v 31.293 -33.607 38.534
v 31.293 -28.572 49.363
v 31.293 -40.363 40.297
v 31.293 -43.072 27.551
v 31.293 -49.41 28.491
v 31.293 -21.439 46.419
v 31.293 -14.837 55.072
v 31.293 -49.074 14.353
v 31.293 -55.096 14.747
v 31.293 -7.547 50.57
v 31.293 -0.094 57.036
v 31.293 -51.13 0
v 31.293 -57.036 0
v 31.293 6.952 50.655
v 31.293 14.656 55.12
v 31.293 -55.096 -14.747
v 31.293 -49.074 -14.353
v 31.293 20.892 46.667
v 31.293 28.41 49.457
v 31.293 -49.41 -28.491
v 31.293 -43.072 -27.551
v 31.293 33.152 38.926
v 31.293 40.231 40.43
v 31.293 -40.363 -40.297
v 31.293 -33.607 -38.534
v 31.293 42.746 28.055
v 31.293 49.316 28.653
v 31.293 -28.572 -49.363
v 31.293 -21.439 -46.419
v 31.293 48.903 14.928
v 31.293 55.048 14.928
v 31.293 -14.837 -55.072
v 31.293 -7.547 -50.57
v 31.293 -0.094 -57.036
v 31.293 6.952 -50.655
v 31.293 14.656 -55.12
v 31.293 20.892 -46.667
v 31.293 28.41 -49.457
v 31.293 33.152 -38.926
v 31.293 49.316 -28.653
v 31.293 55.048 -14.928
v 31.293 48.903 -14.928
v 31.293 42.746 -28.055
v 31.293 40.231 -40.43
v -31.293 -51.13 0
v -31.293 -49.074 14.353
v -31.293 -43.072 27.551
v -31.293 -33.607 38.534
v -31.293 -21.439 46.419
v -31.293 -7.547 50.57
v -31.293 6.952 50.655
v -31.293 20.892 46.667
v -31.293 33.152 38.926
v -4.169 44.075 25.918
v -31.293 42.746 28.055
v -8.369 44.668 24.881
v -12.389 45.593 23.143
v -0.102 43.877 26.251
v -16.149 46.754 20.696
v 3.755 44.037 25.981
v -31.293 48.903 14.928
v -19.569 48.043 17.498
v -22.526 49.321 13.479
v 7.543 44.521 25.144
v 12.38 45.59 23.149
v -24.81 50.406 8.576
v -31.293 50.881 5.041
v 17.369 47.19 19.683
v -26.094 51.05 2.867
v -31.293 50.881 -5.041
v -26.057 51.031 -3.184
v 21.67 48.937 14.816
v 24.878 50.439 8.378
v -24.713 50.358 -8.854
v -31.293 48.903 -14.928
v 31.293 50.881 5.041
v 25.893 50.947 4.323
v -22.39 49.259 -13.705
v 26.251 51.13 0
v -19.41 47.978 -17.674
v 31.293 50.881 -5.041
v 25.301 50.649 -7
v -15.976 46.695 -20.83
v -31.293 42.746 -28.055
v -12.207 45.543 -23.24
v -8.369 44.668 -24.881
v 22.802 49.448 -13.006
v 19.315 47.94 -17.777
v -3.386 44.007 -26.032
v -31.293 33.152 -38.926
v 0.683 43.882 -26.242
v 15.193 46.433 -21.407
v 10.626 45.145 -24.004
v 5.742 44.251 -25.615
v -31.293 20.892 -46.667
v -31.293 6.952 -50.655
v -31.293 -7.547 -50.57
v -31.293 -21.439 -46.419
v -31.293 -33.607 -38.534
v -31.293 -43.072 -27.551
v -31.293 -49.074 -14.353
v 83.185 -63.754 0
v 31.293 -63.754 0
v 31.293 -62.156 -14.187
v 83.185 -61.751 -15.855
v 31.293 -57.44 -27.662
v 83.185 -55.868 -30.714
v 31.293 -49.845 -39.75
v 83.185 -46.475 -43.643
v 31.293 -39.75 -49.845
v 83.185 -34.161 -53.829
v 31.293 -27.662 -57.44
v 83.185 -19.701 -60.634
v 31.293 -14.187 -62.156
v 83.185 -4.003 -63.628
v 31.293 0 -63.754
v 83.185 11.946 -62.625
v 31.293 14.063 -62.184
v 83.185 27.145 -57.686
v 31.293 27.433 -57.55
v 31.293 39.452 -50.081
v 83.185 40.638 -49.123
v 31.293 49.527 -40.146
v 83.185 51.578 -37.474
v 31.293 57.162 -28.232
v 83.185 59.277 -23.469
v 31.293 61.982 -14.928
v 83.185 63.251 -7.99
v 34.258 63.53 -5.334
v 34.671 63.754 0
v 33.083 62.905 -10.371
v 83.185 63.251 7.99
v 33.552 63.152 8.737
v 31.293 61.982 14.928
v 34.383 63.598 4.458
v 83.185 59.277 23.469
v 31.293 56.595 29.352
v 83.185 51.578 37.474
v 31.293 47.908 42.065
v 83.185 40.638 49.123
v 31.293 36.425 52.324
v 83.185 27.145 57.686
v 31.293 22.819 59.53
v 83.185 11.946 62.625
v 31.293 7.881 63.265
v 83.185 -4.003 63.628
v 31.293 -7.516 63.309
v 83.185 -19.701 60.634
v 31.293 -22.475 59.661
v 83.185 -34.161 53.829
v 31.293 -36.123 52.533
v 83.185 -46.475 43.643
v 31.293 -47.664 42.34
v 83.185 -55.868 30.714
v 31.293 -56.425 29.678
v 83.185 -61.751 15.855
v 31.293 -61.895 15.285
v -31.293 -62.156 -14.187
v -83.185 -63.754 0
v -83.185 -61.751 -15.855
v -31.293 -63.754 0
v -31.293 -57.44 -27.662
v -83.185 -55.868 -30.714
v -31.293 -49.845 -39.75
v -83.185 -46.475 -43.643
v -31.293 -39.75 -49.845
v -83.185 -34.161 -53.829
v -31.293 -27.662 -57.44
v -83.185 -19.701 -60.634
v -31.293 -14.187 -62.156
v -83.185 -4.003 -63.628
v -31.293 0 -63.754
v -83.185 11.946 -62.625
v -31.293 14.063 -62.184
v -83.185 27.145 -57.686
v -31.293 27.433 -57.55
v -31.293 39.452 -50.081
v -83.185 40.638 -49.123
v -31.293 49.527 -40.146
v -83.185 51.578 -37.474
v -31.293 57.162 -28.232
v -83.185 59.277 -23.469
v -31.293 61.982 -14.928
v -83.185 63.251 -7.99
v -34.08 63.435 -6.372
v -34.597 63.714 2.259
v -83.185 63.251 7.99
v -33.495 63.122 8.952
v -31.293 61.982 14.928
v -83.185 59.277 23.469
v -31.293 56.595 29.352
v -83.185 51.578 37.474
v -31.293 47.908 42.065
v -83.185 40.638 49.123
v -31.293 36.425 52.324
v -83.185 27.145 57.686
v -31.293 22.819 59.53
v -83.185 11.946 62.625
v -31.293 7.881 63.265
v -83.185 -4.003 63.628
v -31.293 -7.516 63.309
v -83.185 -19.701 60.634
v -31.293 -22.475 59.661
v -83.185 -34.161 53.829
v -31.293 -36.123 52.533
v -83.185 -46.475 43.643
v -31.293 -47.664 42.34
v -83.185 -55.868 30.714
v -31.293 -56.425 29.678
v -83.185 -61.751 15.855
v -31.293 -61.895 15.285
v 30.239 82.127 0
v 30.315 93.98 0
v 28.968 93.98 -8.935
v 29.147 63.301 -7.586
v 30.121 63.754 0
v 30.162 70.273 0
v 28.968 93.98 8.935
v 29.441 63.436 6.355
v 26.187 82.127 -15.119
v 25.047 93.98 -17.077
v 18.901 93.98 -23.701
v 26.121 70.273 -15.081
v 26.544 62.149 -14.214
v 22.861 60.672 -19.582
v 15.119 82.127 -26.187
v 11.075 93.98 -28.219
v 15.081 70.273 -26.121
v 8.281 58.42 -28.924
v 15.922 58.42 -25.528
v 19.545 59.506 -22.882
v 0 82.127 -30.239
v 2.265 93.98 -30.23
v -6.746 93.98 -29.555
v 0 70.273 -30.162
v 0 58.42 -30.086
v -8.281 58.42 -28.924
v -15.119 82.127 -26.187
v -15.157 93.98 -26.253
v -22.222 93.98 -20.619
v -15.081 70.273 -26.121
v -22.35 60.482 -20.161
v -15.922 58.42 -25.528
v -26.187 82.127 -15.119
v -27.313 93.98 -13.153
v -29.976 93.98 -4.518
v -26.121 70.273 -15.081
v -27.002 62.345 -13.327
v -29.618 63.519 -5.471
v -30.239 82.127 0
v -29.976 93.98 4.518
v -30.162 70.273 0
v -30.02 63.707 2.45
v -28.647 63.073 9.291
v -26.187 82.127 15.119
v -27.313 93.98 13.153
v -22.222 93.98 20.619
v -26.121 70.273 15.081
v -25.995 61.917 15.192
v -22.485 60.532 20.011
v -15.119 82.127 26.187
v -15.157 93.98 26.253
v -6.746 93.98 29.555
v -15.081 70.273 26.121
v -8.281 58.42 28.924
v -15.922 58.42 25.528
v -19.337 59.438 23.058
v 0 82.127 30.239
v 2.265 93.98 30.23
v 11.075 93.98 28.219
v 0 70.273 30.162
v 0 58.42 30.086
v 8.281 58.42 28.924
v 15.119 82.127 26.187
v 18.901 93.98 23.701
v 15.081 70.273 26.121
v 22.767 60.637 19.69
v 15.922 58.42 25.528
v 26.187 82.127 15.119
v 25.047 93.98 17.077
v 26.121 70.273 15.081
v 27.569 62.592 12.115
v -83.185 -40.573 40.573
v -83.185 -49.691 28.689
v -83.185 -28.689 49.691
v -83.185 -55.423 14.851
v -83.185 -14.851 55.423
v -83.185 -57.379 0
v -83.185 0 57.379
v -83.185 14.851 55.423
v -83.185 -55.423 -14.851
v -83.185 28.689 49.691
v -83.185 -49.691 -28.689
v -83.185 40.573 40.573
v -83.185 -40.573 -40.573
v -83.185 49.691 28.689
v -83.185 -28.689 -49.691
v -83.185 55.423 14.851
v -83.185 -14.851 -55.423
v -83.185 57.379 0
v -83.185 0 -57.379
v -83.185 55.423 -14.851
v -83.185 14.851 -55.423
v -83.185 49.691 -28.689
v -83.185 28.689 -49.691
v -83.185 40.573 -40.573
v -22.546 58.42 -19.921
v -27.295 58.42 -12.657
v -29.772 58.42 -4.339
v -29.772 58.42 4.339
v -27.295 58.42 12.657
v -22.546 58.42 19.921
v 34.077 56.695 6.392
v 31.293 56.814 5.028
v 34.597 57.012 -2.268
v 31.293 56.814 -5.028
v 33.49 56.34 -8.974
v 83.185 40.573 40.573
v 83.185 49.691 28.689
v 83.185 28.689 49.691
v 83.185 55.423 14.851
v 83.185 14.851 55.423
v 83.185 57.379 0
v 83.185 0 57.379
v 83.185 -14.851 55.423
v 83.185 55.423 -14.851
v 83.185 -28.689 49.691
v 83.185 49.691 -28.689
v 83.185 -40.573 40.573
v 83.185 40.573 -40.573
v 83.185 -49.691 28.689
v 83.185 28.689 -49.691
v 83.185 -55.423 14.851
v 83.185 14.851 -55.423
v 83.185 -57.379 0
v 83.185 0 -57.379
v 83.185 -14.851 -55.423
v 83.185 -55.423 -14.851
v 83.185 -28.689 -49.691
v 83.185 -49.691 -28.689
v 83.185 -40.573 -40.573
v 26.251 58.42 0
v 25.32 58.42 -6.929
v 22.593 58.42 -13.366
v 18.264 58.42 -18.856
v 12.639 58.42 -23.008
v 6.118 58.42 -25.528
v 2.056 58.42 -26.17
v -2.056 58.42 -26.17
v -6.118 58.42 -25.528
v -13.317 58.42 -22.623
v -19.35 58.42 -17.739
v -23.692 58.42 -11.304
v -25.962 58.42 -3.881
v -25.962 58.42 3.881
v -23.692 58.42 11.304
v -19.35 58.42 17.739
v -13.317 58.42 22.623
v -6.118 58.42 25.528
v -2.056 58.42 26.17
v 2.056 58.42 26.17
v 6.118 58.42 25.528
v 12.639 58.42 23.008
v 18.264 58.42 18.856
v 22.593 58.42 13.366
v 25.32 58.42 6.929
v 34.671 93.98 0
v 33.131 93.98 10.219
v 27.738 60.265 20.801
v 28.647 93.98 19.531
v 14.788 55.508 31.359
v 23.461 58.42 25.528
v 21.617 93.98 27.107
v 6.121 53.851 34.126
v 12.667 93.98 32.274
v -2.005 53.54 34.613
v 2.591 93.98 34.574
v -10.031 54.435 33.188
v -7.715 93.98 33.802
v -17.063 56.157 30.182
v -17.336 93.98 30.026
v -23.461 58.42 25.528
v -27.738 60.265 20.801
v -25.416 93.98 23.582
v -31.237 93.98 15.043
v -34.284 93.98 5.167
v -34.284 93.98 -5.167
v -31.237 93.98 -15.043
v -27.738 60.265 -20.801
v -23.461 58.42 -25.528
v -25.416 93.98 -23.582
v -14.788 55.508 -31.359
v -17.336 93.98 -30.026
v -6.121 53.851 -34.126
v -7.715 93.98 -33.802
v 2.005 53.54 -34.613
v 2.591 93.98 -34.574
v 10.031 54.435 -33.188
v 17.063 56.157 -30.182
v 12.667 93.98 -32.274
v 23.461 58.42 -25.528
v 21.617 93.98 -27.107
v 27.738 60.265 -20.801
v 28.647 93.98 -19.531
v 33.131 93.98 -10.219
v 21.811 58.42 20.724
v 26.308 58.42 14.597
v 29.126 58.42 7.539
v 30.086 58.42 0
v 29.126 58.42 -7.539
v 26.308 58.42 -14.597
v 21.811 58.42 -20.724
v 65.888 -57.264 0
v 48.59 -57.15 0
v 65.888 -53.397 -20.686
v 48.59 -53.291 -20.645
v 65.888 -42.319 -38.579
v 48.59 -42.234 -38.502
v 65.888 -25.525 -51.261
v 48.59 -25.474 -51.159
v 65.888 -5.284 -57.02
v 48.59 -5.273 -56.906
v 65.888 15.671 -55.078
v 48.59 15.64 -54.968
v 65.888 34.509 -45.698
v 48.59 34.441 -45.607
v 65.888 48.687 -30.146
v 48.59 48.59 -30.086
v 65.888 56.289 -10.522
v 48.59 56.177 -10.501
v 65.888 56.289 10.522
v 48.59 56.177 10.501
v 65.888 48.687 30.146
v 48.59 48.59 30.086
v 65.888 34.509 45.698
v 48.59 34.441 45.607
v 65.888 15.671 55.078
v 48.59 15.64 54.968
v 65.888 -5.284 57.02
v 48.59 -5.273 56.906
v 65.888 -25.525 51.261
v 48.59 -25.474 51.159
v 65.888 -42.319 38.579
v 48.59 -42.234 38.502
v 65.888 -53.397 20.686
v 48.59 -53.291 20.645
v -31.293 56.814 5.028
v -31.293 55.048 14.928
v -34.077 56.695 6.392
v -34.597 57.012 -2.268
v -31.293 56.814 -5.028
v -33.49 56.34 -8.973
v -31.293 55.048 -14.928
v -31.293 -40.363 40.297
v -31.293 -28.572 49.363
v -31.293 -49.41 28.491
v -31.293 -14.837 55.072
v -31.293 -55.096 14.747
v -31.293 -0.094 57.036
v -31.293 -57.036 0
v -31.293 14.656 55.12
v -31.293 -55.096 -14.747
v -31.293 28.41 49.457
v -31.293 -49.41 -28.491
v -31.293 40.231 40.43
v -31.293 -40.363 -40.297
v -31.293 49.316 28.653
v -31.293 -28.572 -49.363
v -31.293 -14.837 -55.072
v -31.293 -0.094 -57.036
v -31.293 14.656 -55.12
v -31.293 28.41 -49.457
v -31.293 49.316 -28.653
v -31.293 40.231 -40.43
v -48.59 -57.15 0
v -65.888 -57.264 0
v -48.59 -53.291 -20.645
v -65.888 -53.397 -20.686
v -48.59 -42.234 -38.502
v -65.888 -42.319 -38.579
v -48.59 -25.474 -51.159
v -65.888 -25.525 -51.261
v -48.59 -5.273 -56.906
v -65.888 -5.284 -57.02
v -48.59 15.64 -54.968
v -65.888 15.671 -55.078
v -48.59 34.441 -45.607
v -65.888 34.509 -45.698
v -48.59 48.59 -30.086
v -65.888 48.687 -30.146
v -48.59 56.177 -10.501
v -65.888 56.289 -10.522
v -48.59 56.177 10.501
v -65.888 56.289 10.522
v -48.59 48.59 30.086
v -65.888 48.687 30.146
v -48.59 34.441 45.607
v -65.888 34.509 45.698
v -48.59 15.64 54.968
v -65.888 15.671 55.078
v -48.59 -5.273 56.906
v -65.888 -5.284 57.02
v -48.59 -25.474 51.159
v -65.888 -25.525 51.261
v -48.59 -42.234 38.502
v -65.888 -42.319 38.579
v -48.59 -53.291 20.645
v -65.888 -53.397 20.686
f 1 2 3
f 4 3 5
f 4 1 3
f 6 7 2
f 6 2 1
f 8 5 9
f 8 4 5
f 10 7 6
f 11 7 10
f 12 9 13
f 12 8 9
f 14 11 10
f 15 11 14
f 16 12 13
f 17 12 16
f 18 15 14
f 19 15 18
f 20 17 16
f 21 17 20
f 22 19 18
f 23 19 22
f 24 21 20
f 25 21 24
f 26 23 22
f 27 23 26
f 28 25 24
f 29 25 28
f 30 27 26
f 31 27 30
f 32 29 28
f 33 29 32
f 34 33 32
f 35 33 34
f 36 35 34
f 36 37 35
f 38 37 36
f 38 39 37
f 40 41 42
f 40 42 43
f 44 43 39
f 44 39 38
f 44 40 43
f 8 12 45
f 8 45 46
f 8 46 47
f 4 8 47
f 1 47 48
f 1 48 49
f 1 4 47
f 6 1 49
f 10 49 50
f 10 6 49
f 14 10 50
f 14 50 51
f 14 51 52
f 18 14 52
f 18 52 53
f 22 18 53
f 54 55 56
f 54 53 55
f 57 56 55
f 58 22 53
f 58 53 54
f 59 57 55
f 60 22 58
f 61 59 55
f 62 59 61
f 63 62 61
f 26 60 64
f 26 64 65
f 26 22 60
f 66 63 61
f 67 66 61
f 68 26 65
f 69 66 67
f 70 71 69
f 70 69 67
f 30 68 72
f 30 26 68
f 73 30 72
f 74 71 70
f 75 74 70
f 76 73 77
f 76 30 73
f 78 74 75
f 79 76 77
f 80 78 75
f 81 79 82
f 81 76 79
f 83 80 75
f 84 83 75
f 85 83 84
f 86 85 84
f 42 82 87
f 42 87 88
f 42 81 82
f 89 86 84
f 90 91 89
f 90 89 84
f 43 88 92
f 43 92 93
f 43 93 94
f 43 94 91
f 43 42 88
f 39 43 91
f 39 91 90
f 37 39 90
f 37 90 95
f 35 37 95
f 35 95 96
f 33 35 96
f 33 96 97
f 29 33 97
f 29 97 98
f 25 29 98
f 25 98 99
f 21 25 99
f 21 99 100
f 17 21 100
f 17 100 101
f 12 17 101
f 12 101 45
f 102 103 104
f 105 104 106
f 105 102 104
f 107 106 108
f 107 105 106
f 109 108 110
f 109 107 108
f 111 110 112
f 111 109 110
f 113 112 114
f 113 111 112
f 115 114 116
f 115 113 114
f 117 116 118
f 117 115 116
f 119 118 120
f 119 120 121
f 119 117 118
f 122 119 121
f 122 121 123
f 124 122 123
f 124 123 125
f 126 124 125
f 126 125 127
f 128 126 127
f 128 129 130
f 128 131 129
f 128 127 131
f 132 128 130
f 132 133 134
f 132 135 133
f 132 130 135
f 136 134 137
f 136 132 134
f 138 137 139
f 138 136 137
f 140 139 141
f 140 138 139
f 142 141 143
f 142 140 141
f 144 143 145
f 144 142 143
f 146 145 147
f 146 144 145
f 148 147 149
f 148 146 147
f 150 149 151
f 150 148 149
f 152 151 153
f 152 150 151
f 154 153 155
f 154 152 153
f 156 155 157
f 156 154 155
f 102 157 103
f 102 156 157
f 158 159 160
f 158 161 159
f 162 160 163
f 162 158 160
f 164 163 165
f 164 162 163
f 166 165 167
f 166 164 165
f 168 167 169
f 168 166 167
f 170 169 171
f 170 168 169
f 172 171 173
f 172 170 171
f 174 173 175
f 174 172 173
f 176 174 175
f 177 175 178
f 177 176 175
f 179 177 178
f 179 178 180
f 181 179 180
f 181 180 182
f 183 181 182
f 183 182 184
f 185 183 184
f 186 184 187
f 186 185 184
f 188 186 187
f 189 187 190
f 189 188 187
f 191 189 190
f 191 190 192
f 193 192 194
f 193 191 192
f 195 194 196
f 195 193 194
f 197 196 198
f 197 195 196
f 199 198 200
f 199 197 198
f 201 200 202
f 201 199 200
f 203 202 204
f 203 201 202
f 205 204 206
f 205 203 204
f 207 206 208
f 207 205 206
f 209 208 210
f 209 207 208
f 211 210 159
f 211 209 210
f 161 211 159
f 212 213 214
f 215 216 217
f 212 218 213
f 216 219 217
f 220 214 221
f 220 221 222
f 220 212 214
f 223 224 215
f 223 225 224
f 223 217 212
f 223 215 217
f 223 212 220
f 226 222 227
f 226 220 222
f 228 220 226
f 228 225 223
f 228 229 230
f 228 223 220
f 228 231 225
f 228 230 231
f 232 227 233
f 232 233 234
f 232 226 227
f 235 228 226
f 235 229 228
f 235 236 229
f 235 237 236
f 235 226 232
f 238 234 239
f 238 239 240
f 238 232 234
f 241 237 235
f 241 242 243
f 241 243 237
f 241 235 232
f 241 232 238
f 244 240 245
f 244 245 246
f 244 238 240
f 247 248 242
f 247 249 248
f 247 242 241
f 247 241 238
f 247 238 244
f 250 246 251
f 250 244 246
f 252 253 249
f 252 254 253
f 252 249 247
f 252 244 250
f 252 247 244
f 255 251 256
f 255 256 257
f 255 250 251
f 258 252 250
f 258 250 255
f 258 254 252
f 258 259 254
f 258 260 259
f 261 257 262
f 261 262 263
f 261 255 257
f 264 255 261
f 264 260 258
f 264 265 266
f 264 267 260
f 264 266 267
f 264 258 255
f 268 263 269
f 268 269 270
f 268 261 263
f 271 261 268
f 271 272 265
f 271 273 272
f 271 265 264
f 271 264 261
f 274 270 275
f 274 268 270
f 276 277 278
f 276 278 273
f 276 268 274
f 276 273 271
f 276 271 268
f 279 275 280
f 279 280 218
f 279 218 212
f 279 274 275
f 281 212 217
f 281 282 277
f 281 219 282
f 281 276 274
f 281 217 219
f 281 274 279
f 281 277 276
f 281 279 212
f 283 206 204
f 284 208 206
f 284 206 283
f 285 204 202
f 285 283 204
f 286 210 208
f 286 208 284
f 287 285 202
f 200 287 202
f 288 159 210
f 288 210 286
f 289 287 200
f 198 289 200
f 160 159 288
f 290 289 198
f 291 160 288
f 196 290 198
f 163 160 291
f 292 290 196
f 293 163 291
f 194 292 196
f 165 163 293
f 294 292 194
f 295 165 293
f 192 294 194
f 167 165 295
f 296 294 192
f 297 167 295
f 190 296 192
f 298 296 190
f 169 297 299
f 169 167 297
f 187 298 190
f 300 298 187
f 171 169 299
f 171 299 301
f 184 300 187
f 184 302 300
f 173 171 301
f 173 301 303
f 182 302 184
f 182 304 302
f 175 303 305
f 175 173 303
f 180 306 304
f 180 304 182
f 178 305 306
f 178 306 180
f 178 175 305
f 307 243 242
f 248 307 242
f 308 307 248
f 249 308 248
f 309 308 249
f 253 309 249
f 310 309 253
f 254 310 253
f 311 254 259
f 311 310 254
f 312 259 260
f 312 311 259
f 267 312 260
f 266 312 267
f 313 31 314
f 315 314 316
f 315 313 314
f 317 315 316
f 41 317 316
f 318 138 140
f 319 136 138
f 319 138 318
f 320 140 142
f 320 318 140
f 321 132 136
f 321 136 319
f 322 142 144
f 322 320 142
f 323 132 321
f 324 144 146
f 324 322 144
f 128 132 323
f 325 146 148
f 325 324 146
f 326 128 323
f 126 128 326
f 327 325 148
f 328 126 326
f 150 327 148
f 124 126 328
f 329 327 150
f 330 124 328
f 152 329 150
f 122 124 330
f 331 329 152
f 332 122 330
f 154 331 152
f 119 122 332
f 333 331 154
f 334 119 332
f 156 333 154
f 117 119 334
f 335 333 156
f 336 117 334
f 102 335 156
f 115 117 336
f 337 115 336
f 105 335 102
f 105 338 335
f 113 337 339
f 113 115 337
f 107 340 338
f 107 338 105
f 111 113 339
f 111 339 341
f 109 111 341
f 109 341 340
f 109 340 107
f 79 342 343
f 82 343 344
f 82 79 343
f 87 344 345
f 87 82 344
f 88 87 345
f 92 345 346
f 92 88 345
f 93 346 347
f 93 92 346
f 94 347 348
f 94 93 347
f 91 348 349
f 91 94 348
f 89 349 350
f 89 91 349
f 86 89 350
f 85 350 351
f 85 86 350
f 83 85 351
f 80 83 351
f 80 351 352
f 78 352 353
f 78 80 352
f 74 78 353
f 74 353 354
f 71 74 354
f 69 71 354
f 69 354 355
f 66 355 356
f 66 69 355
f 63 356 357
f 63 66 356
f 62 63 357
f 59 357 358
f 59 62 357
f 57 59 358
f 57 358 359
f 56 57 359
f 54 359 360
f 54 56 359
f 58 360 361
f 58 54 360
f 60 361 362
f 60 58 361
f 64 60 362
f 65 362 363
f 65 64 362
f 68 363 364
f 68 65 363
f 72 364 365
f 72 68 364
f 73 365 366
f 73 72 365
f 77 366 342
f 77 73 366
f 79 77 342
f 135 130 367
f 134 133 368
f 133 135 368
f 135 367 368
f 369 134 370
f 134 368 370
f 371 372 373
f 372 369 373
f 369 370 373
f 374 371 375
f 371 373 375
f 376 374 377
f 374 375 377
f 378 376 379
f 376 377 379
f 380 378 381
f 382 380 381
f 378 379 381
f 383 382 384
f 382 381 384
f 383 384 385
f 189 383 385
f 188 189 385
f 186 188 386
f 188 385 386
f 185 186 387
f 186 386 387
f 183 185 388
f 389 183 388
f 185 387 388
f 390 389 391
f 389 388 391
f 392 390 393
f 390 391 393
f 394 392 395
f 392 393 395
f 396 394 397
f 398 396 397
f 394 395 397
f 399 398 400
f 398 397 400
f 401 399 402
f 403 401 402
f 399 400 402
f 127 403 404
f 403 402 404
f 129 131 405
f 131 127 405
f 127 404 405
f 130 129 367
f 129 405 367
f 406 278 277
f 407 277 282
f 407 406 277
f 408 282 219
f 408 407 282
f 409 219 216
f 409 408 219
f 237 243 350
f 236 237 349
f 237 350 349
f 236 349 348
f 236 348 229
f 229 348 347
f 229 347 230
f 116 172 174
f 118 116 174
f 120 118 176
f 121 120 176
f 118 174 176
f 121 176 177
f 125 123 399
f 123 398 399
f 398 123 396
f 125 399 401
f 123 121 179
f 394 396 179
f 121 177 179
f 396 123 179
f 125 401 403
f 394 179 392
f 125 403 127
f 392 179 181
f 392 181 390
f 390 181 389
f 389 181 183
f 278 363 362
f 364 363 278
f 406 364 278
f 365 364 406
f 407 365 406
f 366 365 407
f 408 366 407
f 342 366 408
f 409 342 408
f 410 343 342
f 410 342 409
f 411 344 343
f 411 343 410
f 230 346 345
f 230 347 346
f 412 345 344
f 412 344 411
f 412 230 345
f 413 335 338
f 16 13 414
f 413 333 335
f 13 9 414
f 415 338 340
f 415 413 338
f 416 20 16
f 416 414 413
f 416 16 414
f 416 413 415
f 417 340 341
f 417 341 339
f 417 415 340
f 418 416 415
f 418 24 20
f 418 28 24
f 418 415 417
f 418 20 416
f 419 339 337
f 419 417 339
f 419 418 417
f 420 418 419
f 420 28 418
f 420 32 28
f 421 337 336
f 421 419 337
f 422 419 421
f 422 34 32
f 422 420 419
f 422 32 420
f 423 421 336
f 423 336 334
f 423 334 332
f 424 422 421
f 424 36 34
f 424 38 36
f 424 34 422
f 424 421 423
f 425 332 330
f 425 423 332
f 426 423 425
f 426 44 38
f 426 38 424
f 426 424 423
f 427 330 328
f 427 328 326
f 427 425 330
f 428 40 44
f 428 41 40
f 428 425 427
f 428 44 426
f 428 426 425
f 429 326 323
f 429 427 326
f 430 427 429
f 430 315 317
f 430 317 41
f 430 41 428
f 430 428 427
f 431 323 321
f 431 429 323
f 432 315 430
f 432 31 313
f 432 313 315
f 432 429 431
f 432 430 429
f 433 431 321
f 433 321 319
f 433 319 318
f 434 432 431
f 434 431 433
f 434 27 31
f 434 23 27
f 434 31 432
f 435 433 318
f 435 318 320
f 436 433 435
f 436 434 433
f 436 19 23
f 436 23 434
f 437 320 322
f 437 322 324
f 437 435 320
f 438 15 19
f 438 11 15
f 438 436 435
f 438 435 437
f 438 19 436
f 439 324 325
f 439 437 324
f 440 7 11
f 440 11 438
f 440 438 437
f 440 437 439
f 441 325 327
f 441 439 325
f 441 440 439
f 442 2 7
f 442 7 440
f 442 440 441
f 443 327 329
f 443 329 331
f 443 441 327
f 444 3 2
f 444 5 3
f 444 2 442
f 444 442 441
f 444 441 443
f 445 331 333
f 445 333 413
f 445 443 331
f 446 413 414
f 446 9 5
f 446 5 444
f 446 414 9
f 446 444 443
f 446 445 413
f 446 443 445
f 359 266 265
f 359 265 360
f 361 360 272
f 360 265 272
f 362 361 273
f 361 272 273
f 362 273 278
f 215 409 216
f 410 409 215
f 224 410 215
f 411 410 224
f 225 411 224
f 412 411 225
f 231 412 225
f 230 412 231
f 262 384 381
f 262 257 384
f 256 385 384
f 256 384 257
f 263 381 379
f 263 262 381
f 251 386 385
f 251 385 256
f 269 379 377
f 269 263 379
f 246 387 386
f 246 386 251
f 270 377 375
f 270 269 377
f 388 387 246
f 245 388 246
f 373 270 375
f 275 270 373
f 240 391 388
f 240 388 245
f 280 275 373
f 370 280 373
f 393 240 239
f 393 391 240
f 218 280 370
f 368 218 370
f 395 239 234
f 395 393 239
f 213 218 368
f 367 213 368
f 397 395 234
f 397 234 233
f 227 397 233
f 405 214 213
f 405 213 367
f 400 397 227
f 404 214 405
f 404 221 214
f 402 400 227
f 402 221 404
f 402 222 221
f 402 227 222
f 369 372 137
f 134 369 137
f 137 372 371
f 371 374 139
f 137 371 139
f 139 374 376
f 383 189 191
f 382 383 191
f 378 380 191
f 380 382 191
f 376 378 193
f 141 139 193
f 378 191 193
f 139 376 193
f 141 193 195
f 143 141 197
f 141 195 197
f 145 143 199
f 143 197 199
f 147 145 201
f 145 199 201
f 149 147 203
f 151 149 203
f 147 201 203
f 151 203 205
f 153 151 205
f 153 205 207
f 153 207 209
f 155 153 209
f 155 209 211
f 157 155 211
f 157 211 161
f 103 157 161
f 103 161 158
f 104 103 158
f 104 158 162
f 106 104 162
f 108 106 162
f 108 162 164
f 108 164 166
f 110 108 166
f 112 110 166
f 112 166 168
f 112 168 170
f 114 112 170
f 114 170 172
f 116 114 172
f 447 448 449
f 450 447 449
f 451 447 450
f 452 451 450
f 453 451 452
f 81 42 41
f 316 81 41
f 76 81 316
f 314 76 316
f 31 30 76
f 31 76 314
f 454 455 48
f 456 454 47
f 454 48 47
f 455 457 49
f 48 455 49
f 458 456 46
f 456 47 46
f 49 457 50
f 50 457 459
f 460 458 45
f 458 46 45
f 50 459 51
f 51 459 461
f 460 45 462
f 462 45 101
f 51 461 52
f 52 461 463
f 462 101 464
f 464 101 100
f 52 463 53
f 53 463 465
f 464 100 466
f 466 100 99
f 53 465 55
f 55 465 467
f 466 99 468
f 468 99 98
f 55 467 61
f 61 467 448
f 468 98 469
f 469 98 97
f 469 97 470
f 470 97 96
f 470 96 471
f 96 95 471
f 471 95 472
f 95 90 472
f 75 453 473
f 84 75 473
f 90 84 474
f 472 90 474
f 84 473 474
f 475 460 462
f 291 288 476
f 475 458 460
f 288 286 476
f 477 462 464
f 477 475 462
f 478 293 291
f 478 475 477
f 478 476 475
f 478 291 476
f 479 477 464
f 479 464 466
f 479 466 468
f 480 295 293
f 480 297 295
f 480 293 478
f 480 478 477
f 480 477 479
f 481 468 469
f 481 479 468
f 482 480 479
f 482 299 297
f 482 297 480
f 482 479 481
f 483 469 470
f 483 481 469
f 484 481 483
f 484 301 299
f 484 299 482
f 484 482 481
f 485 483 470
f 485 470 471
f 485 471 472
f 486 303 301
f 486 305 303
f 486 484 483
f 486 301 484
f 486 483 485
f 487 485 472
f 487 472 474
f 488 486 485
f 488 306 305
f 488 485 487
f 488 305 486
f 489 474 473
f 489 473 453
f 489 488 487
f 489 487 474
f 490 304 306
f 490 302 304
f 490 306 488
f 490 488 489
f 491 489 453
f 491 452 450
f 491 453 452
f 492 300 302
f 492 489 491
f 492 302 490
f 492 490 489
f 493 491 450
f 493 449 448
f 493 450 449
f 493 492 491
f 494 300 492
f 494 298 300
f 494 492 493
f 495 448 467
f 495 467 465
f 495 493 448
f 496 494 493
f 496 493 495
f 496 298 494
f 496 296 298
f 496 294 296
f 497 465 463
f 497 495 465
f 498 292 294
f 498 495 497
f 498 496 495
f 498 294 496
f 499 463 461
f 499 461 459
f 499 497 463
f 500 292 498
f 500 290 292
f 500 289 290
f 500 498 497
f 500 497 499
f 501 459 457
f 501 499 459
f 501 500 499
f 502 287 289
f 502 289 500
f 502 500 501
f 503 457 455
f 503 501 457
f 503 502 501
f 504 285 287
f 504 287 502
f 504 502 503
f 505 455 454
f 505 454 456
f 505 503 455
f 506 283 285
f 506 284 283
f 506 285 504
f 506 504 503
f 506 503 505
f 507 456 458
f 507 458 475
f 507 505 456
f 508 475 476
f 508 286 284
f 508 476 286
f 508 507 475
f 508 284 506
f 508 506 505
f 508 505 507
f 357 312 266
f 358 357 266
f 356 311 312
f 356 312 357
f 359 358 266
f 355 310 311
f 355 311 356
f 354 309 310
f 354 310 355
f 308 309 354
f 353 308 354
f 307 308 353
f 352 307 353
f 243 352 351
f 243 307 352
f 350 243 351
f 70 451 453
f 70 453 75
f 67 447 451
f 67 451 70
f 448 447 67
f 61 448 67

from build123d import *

# Parameters (mm, degrees)
SKETCH4_R           = 63.754
BOSS_EXTRUDE1_DEPTH = 62.5856
SKETCH5_R           = 34.671
BOSS_EXTRUDE2_DEPTH = 58.42


with BuildPart() as part:
    # Sketch1 → Revolve1 (revolve)
    with BuildSketch(Plane.XY):
        Polygon((-83.185, -63.754), (-31.2928, -63.754), (-31.2928, -57.0357), (-83.185, -57.3786), align=None)
        Polygon((83.185, -57.3786), (31.2928, -57.0357), (31.2928, -63.754), (83.185, -63.754), align=None)
    revolve(axis=Axis((-83.185, 0, 0), (1, 0, 0)))



with BuildPart() as body_2:
    # Sketch2 → Revolve2 (revolve)
    with BuildSketch(Plane.XY):
        Polygon((30.3149, 93.98), (30.0863, 58.42), (34.671, 58.42), (34.671, 93.98), align=None)
    revolve(axis=Axis((0, 0, 0), (0, 1, 0)))


with BuildPart() as part_1:
    add(part.part)

    add(body_2.part)  # Boss-Extrude1 merges body 2
    # Sketch4 → Boss-Extrude1 (add)
    with BuildSketch(Plane(origin=(-31.2928, 0, 0), x_dir=(0, 0, -1), z_dir=(1, 0, 0))):
        Circle(SKETCH4_R)
    extrude(amount=BOSS_EXTRUDE1_DEPTH)

    # Sketch5 → Boss-Extrude2 (add)
    with BuildSketch(Plane.XZ.offset(-58.42)):
        Circle(SKETCH5_R)
    extrude(amount=BOSS_EXTRUDE2_DEPTH)

    # Sketch6 → Cut-Revolve1 (revolve, cut)
    with BuildSketch(Plane.XY):
        Polygon((-83.185, -57.3786), (-31.2928, -57.0357), (-31.2928, -51.1302), (31.2928, -51.1302), (31.2928, -57.0357), (83.185, -57.3786), (83.185, 0), (-83.185, 0), align=None)
    revolve(axis=Axis((83.185, 0, 0), (-1, 0, 0)), mode=Mode.SUBTRACT)

    # Sketch7 → Cut-Revolve2 (revolve, cut)
    with BuildSketch(Plane.XY):
        Polygon((30.3149, 93.98), (30.0863, 58.42), (26.2509, 58.42), (26.2509, 0), (0, 0), (0, 93.98), align=None)
    revolve(axis=Axis((0, 0, 0), (0, 1, 0)), mode=Mode.SUBTRACT)


solid = part_1.part
